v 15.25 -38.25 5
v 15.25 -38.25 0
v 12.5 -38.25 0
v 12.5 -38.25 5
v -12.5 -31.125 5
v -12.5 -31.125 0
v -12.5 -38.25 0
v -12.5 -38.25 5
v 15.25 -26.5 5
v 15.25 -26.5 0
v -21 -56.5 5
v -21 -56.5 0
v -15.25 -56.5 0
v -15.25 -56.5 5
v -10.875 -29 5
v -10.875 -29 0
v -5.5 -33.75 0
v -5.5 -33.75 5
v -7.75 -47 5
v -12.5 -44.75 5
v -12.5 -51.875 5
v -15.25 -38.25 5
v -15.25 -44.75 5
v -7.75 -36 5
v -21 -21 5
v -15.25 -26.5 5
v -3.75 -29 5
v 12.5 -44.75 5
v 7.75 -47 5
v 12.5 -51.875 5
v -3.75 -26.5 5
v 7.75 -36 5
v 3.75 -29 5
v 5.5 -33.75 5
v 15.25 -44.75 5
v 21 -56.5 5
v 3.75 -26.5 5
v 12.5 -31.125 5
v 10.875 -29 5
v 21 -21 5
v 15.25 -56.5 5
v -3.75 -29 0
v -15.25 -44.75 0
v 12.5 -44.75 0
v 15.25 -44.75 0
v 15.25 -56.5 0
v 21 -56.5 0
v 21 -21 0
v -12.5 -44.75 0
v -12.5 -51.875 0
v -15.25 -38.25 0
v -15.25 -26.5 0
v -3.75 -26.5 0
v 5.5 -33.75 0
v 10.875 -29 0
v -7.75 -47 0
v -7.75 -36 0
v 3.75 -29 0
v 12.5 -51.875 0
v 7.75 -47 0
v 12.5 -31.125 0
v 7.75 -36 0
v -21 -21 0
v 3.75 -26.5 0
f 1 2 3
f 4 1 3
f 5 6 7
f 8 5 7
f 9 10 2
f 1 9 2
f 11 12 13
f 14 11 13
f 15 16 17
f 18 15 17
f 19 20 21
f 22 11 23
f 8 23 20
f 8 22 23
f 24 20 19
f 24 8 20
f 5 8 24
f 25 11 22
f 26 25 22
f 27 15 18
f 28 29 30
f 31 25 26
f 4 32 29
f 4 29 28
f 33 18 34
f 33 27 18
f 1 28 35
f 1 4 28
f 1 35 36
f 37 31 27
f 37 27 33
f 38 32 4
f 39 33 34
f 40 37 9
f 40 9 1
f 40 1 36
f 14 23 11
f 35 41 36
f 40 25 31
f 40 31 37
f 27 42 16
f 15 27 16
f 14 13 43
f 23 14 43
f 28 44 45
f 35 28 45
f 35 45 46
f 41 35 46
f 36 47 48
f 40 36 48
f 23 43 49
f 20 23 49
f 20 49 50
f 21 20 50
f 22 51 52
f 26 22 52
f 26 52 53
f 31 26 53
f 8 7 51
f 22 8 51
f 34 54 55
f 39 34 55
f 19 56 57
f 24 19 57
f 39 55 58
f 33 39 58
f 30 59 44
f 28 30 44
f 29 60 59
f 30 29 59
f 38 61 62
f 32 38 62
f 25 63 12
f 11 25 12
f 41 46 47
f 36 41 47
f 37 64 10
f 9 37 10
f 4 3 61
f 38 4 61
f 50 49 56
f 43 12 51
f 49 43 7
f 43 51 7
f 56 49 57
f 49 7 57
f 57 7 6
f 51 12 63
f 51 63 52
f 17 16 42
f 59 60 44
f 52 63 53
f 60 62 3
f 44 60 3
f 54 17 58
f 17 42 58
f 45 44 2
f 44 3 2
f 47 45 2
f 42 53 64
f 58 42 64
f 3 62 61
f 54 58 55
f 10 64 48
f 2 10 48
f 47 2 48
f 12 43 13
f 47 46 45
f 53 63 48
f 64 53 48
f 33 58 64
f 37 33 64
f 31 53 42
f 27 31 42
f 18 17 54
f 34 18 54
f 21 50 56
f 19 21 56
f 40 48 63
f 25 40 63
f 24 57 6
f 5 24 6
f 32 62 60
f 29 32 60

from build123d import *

# Parameters (mm, degrees)
F1_DEPTH = 5


# Not quite as in the source:
# - a feature names something its author has since deleted; it is built from what else it names


with BuildPart() as f1:
    # F0 (on Top) → F1 (new body)
    with BuildSketch(Plane.XY):
        Polygon((-3.25, -21), (-21, -21), (-21, -26.5), (-21, -56.5), (-15.25, -56.5), (-15.25, -44.75), (-15.25, -38.25), (-15.25, -26.5), (-3.75, -26.5), (0, -26.5), (3.75, -26.5), (15.25, -26.5), (15.25, -38.25), (15.25, -44.75), (15.25, -56.5), (21, -56.5), (21, -26.5), (21, -21), (3.25, -21), (0, -21), align=None)
        Polygon((0, -26.5), (-3.75, -26.5), (-3.75, -29), (-10.875, -29), (-5.5, -33.75), (0, -33.75), (5.5, -33.75), (10.875, -29), (3.75, -29), (3.75, -26.5), align=None)
        Polygon((-15.25, -38.25), (-15.25, -44.75), (-12.5, -44.75), (-12.5, -51.875), (-7.75, -47), (-7.75, -41.5), (-7.75, -36), (-12.5, -31.125), (-12.5, -38.25), align=None)
        Polygon((12.5, -44.75), (15.25, -44.75), (15.25, -38.25), (12.5, -38.25), (12.5, -31.125), (7.75, -36), (7.75, -41.5), (7.75, -47), (12.5, -51.875), align=None)
    extrude(amount=F1_DEPTH)


solid = f1.part
